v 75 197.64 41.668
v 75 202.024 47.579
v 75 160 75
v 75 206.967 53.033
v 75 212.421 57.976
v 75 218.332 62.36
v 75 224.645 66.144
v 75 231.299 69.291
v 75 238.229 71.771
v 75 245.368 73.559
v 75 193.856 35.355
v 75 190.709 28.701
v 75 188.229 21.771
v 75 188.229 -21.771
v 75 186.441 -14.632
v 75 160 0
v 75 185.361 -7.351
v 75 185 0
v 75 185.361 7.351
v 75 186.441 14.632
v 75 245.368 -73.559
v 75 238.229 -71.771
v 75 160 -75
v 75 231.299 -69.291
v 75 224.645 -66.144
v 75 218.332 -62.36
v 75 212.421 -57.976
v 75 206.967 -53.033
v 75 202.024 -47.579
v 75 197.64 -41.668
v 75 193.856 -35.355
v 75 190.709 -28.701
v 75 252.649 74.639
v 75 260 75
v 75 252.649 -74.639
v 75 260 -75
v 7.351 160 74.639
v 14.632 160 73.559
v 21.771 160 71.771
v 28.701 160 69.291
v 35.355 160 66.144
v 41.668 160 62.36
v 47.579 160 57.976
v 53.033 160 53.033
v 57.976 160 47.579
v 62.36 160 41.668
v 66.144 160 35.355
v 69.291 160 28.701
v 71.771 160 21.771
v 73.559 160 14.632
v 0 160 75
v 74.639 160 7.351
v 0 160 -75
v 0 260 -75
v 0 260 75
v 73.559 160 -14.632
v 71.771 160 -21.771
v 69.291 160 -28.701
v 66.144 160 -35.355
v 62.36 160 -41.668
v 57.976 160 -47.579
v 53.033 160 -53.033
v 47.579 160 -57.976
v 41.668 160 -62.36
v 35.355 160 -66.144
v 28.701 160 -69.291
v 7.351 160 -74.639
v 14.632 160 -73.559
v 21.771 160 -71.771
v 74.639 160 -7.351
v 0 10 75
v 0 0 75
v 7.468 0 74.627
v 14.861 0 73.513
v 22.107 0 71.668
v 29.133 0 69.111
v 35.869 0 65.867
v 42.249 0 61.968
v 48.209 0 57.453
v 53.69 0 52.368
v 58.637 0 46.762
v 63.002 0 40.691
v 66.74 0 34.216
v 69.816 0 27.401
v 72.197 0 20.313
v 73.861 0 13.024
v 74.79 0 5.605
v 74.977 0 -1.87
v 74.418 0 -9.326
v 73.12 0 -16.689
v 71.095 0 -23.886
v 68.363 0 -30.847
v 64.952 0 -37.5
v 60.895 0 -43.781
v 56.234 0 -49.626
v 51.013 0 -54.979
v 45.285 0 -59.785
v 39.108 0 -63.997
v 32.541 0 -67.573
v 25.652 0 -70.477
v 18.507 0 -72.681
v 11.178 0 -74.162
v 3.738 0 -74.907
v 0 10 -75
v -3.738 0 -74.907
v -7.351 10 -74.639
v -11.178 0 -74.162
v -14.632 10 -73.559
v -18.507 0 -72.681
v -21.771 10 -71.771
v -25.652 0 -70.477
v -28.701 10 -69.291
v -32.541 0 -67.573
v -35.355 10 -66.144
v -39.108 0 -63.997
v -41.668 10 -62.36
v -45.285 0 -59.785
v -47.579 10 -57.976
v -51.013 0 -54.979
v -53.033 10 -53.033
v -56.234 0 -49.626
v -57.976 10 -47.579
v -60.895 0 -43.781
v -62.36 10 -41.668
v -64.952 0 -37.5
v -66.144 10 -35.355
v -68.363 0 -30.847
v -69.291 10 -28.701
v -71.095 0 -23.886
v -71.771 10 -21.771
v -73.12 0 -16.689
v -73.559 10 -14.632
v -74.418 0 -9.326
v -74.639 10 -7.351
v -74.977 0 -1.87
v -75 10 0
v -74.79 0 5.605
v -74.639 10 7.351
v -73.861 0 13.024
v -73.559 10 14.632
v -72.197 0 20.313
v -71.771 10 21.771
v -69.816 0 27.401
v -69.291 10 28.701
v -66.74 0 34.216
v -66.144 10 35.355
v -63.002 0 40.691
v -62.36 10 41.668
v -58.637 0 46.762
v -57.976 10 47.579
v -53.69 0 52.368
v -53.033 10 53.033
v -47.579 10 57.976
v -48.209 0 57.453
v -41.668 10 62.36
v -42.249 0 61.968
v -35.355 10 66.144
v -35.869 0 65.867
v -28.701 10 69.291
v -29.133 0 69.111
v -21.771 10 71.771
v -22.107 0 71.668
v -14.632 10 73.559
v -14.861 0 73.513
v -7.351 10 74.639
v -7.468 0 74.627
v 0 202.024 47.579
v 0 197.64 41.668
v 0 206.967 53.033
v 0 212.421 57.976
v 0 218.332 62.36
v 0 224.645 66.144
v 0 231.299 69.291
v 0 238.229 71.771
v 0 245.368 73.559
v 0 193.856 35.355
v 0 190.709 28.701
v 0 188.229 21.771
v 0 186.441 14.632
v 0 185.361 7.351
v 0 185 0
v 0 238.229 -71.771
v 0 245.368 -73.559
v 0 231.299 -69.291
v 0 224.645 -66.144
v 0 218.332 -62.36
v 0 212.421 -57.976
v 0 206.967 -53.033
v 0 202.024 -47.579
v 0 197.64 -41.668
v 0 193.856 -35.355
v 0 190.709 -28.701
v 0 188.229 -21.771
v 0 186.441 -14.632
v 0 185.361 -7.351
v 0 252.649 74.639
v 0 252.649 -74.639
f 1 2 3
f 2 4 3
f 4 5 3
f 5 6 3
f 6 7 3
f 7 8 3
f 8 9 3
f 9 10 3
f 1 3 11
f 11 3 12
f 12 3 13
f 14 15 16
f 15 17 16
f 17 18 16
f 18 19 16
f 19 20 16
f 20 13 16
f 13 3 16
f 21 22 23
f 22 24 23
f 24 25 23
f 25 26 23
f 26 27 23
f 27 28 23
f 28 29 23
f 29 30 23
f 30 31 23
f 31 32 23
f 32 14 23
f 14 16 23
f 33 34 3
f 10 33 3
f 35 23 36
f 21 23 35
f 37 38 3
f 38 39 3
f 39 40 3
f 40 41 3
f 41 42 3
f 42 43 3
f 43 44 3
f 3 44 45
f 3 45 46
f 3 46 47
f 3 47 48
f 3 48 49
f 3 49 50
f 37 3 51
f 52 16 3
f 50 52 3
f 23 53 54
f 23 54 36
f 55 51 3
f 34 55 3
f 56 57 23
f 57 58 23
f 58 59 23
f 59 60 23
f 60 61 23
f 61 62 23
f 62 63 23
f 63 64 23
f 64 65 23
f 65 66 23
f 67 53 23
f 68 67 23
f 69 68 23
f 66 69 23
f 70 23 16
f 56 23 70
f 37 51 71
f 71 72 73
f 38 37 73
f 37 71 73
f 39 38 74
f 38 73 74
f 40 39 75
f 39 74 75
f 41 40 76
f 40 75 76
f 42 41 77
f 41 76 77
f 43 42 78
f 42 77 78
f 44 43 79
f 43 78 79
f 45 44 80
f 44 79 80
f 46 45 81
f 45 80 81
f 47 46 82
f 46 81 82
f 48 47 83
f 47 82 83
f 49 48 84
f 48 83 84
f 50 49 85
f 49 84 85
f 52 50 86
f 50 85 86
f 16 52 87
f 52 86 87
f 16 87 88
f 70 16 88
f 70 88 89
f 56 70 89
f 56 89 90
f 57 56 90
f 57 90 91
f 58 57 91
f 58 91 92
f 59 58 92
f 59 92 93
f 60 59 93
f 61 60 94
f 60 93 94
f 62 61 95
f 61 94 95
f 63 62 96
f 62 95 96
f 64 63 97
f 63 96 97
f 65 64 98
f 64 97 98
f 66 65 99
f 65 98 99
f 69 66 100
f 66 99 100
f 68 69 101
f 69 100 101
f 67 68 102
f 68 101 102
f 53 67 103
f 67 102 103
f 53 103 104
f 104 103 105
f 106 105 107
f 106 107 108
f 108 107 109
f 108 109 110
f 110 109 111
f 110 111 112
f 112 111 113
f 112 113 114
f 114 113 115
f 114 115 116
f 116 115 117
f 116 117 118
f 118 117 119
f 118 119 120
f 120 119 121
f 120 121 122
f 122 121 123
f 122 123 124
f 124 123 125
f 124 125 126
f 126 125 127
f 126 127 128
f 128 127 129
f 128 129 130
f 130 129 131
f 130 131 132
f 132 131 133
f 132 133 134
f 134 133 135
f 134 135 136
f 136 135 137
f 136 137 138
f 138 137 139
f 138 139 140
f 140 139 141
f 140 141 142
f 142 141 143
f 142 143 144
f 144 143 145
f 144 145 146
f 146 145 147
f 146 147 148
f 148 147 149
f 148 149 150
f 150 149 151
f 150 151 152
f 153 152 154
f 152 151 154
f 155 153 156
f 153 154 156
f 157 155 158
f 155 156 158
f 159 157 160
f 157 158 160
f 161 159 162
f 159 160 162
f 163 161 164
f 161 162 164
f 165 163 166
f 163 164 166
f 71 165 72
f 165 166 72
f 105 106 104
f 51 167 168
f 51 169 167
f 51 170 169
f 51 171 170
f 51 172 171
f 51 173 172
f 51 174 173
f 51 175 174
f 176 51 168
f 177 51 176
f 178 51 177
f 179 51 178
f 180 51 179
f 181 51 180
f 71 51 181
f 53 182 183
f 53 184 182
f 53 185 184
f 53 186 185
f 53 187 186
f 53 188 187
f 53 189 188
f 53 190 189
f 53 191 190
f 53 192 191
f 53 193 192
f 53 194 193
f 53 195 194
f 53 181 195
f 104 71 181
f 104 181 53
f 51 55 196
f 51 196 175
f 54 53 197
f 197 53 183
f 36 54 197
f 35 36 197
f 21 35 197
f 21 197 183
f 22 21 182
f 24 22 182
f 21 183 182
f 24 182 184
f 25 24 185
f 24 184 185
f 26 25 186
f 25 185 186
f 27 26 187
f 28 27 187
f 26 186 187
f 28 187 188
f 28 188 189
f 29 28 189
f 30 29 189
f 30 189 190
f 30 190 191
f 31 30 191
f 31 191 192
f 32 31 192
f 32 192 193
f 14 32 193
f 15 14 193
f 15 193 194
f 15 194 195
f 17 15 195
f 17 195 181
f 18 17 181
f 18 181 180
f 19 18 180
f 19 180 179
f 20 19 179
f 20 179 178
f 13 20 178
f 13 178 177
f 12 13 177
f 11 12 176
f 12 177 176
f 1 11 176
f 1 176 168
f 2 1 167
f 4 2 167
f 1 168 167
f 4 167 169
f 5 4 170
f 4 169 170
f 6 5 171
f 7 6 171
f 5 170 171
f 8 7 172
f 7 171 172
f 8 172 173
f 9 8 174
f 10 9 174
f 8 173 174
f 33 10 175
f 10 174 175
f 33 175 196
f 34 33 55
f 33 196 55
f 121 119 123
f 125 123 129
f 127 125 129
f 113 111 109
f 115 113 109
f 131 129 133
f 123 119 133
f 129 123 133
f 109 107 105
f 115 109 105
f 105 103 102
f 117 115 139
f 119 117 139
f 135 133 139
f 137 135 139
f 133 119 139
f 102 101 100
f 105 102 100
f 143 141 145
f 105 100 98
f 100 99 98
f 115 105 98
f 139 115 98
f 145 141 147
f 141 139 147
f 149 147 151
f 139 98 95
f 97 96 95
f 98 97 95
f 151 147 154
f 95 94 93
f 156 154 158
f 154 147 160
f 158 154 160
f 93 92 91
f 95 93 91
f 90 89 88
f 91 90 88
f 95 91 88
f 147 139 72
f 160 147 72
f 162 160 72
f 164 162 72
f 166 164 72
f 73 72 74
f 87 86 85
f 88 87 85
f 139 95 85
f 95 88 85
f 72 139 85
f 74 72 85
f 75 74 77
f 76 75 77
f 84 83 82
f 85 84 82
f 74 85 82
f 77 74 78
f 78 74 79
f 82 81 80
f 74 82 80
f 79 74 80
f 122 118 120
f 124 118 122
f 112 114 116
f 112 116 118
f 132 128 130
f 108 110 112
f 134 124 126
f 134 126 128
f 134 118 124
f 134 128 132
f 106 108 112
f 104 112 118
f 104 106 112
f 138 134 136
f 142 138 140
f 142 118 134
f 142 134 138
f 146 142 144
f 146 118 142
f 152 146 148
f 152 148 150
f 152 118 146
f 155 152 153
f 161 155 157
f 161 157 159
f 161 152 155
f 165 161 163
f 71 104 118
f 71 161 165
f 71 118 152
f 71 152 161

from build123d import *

# Parameters (mm, degrees)
SKETCH1_R           = 75
BOSS_EXTRUDE1_DEPTH = 10
BOSS_EXTRUDE5_DEPTH = 150
SKETCH13_W          = 75
SKETCH13_H          = 150
BOSS_EXTRUDE6_DEPTH = 100
SKETCH14_R          = 75
CUT_EXTRUDE5_DEPTH  = 100


with BuildPart() as part:
    # Sketch1 → Boss-Extrude1 (new body)
    with BuildSketch(Plane(origin=(0, 0, 0), x_dir=(1, 0, 0), z_dir=(0, 1, 0))):
        with Locations(Location((0, 0, 0), (0, 0, 270))):
            Circle(SKETCH1_R)
    extrude(amount=BOSS_EXTRUDE1_DEPTH)

    # Sketch12 → Boss-Extrude5 (add)
    with BuildSketch(Plane(origin=(0, 10, 0), x_dir=(1, 0, 0), z_dir=(0, 1, 0))):
        with BuildLine():
            Line((0, 75), (0, -75))
            ThreePointArc((0, -75), (75, 0), (0, 75))
        make_face()
    extrude(amount=BOSS_EXTRUDE5_DEPTH)

    # Sketch13 → Boss-Extrude6 (add)
    with BuildSketch(Plane(origin=(0, 160, 0), x_dir=(1, 0, 0), z_dir=(0, 1, 0))):
        with Locations((37.5, 0)):
            Rectangle(SKETCH13_W, SKETCH13_H)
    extrude(amount=BOSS_EXTRUDE6_DEPTH)

    # Sketch14 → Cut-Extrude5 (cut)
    with BuildSketch(Plane.ZY):
        with Locations((0, 260)):
            Circle(SKETCH14_R)
    extrude(amount=-CUT_EXTRUDE5_DEPTH, mode=Mode.SUBTRACT)


solid = part.part
